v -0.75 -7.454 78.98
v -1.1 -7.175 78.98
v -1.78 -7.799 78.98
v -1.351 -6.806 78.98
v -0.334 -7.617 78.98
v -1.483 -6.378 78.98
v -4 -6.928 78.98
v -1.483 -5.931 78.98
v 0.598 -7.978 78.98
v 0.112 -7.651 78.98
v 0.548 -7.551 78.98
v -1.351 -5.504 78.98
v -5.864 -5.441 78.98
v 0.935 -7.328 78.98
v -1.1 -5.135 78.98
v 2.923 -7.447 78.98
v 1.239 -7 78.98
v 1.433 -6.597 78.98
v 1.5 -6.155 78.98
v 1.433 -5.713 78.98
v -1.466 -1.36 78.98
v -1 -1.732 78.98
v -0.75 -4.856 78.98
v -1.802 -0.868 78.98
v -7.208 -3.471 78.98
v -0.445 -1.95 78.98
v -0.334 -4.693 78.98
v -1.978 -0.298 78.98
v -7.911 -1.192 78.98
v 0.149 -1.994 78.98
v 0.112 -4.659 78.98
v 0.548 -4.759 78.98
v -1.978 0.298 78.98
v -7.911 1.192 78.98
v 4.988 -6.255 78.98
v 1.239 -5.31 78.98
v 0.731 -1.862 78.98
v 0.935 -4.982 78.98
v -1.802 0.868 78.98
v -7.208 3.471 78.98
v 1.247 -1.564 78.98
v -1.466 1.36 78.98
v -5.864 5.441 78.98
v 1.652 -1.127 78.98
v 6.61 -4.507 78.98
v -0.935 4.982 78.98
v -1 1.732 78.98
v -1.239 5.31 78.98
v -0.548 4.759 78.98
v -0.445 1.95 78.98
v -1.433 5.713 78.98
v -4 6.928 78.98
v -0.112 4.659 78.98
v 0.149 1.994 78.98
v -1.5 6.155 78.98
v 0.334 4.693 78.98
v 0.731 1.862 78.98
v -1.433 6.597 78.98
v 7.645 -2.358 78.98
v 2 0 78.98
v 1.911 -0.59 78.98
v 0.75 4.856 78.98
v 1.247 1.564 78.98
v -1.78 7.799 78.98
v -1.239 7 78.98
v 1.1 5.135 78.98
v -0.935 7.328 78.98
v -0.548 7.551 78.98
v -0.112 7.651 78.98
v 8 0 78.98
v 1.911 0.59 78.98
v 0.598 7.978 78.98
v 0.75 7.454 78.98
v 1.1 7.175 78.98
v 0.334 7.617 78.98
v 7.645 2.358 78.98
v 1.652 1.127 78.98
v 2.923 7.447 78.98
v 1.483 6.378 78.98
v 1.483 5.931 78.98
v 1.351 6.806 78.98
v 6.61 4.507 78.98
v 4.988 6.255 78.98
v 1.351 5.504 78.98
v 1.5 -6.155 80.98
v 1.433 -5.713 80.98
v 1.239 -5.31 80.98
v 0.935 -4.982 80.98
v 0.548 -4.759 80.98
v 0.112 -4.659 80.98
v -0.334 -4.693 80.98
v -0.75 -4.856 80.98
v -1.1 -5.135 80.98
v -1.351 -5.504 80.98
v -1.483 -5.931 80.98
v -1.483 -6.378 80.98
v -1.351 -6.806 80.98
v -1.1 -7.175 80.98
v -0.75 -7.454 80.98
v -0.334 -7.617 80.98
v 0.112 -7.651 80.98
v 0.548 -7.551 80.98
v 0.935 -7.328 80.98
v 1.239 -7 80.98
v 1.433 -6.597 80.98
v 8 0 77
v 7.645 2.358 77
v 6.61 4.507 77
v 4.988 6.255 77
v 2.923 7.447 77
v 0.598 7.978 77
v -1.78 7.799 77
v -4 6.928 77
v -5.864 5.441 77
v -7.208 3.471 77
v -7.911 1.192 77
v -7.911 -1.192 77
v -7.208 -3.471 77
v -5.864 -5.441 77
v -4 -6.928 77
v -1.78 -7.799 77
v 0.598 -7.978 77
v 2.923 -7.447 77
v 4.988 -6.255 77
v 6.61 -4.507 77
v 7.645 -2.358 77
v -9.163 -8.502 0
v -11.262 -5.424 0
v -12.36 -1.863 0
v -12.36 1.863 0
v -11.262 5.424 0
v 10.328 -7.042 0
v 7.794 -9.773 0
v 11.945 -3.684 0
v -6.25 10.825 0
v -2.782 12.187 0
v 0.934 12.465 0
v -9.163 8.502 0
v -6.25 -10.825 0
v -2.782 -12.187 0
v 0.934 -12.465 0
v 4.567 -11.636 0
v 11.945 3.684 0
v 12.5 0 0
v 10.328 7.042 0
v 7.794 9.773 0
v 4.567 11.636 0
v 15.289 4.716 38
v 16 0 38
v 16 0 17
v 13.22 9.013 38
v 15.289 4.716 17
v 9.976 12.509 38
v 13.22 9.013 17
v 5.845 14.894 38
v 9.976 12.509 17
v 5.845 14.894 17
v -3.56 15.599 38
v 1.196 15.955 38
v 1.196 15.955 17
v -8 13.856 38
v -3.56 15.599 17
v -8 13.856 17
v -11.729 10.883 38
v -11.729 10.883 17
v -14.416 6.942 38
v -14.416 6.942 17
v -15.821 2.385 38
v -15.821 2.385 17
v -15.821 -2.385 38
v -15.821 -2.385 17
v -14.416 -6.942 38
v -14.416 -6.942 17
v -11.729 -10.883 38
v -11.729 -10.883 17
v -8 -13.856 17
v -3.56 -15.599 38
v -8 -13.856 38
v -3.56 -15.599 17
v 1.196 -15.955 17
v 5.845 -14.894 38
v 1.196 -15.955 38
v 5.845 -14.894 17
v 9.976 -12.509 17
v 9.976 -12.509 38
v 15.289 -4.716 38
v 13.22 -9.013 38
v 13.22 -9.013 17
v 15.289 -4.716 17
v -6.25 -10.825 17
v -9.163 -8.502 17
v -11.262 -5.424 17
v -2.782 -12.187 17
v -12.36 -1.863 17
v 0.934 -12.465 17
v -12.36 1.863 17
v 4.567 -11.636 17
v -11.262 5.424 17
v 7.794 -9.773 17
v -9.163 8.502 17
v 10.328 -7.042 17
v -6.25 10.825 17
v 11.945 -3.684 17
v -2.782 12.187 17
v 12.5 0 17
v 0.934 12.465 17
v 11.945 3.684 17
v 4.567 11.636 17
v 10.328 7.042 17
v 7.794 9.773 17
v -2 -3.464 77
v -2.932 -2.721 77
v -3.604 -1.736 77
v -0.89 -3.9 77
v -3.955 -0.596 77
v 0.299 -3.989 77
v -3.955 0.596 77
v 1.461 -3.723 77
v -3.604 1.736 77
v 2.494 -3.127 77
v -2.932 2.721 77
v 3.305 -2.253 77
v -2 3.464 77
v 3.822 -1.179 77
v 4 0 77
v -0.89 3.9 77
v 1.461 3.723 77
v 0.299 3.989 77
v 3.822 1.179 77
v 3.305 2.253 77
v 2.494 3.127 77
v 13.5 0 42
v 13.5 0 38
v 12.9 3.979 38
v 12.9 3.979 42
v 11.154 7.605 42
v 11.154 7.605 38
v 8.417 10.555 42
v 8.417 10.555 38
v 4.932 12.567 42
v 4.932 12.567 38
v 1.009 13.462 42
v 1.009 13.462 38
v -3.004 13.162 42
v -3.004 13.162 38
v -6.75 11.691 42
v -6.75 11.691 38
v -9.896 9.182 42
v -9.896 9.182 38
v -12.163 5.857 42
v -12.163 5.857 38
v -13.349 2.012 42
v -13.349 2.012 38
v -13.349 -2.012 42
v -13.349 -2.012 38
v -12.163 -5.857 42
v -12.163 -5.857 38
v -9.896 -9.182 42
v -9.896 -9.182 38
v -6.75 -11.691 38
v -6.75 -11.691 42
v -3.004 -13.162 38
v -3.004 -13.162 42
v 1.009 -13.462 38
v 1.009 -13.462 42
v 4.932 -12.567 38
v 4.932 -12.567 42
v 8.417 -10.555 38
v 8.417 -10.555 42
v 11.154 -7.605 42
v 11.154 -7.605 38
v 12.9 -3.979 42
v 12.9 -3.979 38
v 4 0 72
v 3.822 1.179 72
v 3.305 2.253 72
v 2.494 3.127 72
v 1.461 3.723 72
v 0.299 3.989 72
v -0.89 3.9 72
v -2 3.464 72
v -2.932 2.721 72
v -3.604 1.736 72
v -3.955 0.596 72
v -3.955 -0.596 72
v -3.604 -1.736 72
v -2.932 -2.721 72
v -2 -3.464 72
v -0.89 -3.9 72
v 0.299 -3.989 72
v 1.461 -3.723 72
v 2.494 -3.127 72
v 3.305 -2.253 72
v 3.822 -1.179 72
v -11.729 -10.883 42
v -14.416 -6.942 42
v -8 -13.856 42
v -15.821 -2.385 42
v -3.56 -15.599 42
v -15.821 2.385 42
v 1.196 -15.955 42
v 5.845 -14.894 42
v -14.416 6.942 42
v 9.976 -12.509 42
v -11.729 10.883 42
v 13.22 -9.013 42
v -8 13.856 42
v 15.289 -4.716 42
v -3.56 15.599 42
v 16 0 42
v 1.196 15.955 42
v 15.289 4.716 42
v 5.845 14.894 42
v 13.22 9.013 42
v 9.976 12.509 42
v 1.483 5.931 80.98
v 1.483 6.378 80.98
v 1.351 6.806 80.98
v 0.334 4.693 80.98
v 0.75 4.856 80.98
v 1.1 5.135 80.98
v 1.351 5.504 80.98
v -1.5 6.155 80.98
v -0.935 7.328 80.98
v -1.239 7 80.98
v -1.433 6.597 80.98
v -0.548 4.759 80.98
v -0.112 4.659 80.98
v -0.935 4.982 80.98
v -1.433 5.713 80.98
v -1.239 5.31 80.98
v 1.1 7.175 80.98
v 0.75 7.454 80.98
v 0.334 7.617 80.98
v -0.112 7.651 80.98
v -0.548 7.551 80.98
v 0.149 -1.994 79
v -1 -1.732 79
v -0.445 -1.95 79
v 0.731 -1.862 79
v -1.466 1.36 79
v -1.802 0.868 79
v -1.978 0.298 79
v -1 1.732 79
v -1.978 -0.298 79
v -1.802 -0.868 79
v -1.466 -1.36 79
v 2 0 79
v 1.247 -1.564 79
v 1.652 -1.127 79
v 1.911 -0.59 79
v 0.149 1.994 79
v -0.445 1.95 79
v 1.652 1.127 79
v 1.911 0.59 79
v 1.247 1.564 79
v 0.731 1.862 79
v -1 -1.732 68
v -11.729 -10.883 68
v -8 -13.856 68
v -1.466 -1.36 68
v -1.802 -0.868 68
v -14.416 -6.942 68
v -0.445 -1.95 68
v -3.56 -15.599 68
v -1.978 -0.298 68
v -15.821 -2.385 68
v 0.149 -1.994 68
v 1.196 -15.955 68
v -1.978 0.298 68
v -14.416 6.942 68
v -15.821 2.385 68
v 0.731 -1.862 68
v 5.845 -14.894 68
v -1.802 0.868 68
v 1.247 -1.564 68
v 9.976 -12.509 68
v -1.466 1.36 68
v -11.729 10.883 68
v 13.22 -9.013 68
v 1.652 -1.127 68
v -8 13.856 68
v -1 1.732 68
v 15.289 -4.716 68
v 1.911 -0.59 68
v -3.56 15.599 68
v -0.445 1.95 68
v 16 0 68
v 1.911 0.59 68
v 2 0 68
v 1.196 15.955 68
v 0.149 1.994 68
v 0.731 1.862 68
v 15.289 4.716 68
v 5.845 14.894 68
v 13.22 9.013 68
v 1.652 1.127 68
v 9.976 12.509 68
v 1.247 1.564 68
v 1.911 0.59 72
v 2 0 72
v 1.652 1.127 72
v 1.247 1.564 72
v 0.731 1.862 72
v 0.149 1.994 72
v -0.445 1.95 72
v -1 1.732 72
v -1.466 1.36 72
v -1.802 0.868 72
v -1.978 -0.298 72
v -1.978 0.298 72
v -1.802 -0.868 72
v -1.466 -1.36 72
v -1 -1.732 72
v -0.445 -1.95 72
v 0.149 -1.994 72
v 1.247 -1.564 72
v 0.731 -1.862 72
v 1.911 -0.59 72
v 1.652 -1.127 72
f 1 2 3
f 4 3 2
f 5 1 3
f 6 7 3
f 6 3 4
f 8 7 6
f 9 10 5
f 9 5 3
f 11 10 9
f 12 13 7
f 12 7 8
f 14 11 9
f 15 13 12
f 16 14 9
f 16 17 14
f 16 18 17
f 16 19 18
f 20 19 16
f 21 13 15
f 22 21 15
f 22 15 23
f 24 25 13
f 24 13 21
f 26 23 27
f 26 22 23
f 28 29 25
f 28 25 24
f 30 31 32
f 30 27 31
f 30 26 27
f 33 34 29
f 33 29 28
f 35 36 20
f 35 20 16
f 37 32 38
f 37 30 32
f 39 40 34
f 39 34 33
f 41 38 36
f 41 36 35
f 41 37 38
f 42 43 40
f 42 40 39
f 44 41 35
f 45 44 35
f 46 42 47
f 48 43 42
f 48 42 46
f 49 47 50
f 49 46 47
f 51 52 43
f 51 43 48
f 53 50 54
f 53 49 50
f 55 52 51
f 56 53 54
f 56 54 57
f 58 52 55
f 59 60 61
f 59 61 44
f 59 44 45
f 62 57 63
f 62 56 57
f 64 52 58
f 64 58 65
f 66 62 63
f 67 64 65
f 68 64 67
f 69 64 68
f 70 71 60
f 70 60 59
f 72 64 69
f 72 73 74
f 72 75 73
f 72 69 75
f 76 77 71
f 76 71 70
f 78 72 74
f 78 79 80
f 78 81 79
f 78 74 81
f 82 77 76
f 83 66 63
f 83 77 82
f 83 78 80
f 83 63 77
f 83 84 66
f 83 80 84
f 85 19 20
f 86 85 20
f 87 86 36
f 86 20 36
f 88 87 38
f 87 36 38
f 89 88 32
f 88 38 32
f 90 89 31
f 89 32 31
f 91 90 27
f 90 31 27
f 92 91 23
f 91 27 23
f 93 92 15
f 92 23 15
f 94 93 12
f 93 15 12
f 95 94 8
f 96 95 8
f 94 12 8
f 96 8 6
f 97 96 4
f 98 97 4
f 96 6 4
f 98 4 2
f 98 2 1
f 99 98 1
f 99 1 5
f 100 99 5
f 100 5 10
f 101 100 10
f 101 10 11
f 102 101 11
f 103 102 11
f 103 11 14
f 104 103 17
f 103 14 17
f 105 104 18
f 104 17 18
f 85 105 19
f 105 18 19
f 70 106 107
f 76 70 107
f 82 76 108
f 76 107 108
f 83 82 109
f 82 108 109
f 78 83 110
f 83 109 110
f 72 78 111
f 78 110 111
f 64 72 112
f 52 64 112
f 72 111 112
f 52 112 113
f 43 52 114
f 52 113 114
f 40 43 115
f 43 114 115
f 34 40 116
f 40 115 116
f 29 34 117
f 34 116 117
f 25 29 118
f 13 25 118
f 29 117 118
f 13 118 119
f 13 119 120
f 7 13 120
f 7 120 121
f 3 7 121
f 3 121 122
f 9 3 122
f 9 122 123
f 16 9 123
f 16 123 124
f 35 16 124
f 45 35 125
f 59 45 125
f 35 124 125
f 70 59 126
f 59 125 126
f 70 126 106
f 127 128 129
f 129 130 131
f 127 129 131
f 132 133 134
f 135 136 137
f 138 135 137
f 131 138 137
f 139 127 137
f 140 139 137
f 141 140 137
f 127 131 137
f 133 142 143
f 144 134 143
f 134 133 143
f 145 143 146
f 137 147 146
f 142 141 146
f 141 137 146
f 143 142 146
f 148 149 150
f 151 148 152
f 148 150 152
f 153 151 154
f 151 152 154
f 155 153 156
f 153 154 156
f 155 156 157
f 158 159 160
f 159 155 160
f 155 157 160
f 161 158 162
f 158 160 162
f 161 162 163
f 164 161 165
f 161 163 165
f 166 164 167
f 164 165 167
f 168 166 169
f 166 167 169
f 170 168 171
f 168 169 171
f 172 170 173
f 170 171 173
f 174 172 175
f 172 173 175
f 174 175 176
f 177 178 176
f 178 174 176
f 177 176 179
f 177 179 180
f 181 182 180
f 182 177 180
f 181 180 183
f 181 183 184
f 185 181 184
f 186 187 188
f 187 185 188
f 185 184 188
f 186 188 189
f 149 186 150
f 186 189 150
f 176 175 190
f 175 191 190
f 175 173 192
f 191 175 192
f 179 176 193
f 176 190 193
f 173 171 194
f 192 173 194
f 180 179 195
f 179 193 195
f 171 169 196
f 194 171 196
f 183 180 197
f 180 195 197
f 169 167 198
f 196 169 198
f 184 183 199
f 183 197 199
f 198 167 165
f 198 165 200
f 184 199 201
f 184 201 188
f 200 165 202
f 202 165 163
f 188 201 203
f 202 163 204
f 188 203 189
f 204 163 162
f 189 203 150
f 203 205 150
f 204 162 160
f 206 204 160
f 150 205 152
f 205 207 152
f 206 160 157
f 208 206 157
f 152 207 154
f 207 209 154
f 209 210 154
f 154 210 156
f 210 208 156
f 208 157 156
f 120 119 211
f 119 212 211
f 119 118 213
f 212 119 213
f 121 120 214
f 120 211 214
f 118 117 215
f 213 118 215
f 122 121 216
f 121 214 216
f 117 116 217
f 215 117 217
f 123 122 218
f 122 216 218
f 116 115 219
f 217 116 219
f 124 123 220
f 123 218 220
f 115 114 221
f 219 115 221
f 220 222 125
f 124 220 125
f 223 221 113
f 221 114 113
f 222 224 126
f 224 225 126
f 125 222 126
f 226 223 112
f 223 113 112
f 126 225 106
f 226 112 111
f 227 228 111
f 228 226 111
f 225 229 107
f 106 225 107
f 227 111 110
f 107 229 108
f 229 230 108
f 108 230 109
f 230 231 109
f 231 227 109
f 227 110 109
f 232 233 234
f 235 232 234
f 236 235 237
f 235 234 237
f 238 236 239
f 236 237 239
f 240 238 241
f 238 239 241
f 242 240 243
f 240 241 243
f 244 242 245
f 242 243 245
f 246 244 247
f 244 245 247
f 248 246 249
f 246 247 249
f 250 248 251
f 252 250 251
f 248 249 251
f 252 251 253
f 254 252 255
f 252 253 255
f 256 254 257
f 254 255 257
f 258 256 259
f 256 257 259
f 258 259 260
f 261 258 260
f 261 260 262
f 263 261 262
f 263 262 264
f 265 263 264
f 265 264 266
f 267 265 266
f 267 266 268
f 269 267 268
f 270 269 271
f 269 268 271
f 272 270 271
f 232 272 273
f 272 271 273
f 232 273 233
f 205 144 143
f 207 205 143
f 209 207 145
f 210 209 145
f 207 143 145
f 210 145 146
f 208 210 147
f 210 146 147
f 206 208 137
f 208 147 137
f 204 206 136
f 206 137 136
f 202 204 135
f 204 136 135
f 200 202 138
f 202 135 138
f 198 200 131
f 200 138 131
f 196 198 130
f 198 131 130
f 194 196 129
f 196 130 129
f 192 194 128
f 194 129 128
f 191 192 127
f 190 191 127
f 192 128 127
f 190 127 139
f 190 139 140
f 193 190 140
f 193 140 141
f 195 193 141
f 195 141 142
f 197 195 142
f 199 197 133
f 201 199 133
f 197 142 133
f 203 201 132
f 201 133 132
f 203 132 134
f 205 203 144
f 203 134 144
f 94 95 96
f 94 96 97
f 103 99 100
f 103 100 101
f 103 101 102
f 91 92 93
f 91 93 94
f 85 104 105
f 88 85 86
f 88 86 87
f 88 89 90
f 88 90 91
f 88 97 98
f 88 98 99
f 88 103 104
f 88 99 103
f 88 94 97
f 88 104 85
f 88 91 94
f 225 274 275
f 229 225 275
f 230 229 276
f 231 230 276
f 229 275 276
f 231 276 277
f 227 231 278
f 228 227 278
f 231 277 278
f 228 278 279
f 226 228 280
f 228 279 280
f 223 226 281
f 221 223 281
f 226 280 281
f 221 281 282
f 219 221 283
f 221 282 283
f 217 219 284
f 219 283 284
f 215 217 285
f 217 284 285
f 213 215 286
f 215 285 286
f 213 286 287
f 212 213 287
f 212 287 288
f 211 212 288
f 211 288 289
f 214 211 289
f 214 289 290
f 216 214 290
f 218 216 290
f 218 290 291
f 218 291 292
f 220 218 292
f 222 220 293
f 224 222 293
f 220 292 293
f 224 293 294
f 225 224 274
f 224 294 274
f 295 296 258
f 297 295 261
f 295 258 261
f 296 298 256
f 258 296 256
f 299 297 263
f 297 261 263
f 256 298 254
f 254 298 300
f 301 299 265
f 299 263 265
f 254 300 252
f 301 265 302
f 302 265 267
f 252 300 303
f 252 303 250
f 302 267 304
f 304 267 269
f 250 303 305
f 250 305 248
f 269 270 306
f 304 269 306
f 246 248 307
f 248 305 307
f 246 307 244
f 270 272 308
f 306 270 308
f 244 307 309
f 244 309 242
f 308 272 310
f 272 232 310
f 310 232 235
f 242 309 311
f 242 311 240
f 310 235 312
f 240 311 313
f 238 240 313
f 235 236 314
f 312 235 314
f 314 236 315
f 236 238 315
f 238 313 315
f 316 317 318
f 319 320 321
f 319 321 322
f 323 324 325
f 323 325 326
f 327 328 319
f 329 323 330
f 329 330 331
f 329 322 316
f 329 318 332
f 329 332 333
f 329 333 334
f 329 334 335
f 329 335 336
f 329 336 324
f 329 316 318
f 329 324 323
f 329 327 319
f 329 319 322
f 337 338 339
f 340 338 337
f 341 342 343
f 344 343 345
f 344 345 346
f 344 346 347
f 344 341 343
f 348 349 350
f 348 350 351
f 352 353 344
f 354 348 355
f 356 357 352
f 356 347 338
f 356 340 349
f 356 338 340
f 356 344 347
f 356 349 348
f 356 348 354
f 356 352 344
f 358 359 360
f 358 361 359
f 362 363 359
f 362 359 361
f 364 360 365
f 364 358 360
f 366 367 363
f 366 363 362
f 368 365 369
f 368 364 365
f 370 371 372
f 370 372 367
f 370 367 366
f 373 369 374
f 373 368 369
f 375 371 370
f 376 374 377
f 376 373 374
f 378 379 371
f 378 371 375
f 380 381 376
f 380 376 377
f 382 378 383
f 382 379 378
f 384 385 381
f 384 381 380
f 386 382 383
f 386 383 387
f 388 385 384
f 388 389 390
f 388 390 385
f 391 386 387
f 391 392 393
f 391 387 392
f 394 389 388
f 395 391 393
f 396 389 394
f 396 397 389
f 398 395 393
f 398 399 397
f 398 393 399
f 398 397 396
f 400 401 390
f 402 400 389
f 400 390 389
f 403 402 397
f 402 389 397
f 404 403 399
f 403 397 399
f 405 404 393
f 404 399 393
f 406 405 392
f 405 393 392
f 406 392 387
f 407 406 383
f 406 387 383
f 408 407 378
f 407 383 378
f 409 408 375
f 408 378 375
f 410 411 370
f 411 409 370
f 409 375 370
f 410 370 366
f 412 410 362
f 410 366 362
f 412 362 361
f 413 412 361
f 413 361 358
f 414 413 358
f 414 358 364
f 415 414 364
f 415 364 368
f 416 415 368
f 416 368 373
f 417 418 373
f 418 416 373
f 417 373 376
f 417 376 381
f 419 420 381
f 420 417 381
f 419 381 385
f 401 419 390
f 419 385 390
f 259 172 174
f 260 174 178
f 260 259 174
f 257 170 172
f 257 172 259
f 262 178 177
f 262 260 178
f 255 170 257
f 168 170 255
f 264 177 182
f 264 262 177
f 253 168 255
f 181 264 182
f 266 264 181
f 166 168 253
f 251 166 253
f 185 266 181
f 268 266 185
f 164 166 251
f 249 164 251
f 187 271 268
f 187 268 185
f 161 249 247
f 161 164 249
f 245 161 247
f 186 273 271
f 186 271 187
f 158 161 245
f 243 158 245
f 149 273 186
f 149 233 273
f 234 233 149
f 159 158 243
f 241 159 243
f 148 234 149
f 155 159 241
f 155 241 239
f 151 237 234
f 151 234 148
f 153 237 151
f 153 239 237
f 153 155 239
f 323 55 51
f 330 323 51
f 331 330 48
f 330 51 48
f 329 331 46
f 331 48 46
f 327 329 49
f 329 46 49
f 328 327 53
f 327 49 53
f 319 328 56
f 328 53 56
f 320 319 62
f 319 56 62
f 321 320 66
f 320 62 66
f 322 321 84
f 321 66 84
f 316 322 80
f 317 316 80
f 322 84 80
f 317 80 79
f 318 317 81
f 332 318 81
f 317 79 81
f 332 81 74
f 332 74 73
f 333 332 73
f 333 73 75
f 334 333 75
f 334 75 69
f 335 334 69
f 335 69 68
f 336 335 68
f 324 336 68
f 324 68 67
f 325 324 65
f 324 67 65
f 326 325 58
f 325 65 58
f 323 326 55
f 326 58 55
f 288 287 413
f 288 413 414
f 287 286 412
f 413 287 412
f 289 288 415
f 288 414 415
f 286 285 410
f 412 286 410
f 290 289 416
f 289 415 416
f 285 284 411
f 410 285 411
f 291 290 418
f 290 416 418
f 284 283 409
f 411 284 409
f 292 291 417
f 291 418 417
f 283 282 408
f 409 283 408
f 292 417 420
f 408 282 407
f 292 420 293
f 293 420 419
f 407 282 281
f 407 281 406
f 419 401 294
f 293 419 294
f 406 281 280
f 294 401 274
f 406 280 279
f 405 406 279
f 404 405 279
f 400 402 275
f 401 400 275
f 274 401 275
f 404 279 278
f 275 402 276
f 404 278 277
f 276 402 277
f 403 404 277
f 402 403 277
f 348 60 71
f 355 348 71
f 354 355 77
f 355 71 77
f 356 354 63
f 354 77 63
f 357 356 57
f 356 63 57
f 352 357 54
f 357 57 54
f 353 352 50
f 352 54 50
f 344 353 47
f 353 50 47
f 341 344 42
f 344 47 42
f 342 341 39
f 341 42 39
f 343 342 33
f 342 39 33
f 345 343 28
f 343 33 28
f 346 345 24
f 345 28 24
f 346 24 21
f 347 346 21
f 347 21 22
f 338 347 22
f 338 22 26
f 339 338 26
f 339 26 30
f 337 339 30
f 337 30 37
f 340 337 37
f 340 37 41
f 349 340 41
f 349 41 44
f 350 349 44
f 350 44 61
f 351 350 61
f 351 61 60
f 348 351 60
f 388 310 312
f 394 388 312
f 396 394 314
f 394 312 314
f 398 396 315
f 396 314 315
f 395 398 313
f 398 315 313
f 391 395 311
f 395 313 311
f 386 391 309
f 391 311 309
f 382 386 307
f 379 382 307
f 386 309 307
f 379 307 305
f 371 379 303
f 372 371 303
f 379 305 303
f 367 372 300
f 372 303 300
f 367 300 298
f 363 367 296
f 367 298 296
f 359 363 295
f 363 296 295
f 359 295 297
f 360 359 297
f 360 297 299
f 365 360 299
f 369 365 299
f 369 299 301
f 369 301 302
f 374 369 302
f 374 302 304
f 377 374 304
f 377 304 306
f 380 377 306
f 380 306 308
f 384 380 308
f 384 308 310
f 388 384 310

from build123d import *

# Parameters (mm, degrees)
SKETCH_1_R          = 12.5
EXTRUDE_1_DEPTH     = 17
SKETCH_2_R          = 16
EXTRUDE_2_DEPTH     = 51
SKETCH_3_R          = 2
EXTRUDE_3_DEPTH     = 11
SKETCH_4_R          = 4
EXTRUDE_4_DEPTH     = 5
SKETCH_5_R          = 8
EXTRUDE_5_DEPTH     = 1.98
SKETCH_6_R          = 1.5
EXTRUDE_6_DEPTH     = 2
SKETCH_7_R          = 20.782497367
SKETCH_7_R_2        = 13.5
CUT_EXTRUDE_8_DEPTH = 4


with BuildPart() as part:
    # Эскиз1 → Вытянуть1 (new body)
    with BuildSketch(Plane.XY):
        Circle(SKETCH_1_R)
    extrude(amount=EXTRUDE_1_DEPTH)

    # Эскиз2 → Вытянуть2 (add)
    with BuildSketch(Plane.XY.offset(17)):
        Circle(SKETCH_2_R)
    extrude(amount=EXTRUDE_2_DEPTH)

    # Эскиз3 → Вытянуть3 (add)
    with BuildSketch(Plane.XY.offset(68)):
        Circle(SKETCH_3_R)
    extrude(amount=EXTRUDE_3_DEPTH)

    # Эскиз4 → Вытянуть4 (add)
    with BuildSketch(Plane.XY.offset(72)):
        Circle(SKETCH_4_R)
    extrude(amount=EXTRUDE_4_DEPTH)

    # Эскиз5 → Вытянуть5 (add)
    with BuildSketch(Plane.XY.offset(77)):
        Circle(SKETCH_5_R)
    extrude(amount=EXTRUDE_5_DEPTH)

    # Эскиз6 → Вытянуть6 (add)
    with BuildSketch(Plane.XY.offset(78.98)):
        with Locations((0, -6.154904873)):
            Circle(SKETCH_6_R)
        with Locations(Location((0, 6.154904873, 0), (0, 0, 180))):
            Circle(SKETCH_6_R)
    extrude(amount=EXTRUDE_6_DEPTH)

    # Эскиз7 → Вытянуть8 (cut)
    with BuildSketch(Plane.XY.offset(38)):
        Circle(SKETCH_7_R)
        Circle(SKETCH_7_R_2, mode=Mode.SUBTRACT)
    extrude(amount=CUT_EXTRUDE_8_DEPTH, mode=Mode.SUBTRACT)


solid = part.part
